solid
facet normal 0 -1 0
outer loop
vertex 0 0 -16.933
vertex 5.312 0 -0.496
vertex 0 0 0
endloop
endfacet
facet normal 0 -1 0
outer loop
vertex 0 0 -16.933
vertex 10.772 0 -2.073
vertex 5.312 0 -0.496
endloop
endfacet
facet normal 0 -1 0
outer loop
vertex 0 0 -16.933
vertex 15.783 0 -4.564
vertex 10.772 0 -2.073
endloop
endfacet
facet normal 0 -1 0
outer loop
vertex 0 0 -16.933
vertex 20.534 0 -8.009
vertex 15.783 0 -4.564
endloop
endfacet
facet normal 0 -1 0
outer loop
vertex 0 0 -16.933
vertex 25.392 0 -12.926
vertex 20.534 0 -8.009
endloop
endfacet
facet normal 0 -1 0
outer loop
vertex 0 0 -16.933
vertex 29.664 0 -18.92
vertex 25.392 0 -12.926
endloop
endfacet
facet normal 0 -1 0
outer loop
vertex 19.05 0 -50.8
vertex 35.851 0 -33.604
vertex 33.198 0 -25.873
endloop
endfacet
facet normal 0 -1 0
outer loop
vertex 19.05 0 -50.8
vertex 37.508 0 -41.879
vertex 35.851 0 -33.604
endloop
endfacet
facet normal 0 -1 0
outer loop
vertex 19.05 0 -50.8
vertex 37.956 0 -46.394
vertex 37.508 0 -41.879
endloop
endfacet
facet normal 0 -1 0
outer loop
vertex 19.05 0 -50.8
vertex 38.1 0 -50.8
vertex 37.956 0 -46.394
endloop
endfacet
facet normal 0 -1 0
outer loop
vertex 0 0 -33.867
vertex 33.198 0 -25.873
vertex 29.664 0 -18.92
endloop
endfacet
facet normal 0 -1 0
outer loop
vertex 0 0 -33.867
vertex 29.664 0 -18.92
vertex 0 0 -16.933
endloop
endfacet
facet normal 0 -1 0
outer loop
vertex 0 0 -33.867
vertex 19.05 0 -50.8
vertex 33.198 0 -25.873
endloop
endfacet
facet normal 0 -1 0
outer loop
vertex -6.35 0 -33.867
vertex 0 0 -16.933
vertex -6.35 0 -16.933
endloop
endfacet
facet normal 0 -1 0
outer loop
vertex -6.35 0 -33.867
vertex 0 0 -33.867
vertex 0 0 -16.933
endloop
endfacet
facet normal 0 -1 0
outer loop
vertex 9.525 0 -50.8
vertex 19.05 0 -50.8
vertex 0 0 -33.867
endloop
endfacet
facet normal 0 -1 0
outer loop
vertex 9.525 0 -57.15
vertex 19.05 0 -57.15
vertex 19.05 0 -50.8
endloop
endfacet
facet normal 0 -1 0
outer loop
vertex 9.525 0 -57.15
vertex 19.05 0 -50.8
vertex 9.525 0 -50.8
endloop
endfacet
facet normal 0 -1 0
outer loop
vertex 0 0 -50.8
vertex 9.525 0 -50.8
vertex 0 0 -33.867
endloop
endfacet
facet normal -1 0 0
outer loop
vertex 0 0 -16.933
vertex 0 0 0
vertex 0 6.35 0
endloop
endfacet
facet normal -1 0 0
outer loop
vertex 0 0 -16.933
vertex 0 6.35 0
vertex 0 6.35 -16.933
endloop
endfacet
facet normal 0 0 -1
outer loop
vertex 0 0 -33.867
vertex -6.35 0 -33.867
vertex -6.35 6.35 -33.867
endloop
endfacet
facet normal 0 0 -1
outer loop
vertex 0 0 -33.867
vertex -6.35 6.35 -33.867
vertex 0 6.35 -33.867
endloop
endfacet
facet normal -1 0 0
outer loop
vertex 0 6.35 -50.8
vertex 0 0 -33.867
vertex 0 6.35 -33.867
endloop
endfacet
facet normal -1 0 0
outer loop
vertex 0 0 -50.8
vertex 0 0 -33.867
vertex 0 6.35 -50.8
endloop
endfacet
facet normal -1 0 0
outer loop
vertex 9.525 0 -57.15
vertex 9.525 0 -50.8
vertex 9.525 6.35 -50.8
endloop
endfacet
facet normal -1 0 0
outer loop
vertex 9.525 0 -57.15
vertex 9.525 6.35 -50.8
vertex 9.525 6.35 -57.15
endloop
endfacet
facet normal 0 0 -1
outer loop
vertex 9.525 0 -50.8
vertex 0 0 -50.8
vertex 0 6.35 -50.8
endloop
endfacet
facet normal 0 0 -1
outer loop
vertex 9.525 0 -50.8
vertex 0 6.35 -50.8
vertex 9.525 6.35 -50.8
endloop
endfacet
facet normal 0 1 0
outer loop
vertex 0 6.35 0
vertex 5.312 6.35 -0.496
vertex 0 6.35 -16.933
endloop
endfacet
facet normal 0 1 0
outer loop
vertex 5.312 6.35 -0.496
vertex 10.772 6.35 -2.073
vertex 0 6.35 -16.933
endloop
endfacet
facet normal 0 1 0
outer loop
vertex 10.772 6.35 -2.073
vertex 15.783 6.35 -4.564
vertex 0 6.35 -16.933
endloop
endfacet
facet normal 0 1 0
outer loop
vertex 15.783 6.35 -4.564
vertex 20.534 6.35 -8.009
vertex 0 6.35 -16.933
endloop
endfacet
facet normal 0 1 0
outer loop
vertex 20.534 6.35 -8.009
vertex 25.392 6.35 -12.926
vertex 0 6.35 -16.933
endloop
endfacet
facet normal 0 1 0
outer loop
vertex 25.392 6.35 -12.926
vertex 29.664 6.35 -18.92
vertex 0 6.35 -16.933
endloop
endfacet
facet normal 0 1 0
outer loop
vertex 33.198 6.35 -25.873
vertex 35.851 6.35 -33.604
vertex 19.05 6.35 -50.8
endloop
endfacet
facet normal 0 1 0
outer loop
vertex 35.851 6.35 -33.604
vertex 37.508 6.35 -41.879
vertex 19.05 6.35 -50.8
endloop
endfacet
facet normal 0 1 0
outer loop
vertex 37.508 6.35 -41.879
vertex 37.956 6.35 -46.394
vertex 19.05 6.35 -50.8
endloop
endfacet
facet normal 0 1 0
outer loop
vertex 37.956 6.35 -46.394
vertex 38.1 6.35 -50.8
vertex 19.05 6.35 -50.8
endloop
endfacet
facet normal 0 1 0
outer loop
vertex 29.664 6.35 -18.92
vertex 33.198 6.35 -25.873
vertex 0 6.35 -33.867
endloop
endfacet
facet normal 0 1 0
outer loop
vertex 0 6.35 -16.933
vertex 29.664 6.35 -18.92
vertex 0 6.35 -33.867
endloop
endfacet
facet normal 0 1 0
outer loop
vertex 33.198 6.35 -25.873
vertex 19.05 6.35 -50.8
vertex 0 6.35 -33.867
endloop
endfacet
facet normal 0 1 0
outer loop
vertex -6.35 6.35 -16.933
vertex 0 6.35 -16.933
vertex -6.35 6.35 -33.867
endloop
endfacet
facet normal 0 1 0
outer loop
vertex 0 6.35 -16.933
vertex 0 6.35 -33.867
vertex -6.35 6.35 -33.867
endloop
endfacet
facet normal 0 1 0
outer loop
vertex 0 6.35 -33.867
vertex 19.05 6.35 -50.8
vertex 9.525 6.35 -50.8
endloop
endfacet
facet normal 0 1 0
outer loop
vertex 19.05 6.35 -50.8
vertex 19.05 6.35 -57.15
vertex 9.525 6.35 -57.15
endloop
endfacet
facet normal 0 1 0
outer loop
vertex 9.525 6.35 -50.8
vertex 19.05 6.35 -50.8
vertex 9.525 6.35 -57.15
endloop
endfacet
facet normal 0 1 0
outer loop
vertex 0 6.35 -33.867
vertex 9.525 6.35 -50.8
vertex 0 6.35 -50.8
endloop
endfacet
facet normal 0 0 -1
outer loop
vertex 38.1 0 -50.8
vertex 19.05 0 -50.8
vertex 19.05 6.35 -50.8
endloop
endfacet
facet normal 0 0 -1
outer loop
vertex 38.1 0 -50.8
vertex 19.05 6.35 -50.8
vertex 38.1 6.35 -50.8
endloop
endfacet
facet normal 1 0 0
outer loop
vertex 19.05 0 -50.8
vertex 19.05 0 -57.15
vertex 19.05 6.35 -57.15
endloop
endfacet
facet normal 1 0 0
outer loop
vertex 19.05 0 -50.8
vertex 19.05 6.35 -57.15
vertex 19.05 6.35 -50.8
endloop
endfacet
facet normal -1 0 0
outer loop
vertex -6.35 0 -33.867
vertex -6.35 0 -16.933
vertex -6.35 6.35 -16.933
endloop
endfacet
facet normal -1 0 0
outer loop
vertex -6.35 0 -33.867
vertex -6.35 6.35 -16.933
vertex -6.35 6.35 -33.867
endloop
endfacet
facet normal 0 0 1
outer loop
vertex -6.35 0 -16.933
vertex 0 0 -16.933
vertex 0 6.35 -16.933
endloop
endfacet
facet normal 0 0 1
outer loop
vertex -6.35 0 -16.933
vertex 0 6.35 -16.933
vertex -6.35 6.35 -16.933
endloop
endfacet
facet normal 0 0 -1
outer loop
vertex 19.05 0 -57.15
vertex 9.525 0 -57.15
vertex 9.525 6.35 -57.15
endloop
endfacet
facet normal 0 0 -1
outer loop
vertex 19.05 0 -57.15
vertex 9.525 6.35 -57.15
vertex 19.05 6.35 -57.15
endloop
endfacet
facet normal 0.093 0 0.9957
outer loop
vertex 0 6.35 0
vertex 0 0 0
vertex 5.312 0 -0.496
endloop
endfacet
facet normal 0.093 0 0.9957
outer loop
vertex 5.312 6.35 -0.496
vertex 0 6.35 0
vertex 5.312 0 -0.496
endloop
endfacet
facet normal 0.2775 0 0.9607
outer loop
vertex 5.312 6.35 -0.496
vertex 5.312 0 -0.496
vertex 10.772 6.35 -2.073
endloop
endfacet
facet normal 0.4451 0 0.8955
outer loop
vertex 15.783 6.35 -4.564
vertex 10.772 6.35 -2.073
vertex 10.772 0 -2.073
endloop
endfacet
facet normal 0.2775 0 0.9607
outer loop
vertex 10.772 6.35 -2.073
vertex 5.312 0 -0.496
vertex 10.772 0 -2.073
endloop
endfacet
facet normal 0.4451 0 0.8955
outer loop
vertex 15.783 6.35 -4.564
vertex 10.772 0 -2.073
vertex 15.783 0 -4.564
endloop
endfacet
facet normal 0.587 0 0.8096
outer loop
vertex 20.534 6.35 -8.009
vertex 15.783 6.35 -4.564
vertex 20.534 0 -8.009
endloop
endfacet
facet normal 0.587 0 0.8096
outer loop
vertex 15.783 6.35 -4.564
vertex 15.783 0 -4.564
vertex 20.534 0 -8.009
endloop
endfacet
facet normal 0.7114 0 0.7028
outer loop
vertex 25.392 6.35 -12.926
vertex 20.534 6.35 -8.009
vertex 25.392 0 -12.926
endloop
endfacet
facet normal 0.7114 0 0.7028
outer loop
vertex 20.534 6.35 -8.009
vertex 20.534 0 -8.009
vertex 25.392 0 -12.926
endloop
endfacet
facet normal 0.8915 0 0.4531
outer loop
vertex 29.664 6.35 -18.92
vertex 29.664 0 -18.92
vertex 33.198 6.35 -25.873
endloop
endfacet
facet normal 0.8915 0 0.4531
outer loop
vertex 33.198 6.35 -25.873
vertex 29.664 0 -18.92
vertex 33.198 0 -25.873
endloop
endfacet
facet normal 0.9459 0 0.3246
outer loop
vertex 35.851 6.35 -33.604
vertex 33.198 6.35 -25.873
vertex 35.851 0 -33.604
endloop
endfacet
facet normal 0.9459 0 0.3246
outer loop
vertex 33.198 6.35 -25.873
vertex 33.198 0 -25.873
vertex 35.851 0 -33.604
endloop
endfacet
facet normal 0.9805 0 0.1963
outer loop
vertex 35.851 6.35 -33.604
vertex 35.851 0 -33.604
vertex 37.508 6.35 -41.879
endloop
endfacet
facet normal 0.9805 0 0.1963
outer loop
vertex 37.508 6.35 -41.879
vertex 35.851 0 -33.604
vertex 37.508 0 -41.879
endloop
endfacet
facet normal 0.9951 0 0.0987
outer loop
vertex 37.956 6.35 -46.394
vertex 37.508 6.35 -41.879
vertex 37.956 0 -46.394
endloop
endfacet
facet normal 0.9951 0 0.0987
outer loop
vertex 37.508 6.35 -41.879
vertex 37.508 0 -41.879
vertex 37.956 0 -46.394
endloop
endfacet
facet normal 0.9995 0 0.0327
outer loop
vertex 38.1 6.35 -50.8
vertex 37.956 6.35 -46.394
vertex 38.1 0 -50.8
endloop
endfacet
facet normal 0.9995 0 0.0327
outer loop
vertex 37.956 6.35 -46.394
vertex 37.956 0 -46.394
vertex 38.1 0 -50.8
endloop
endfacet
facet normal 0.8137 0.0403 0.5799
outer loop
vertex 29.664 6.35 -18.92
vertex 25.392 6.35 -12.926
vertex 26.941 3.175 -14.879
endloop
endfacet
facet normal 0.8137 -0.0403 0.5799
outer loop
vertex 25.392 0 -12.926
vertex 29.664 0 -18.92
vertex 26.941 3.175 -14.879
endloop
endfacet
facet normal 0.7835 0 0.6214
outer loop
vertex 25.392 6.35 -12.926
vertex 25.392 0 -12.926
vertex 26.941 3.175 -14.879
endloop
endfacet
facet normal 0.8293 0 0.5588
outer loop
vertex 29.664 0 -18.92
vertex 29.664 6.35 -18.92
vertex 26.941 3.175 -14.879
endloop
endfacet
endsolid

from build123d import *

# Parameters (mm, degrees)
BOSS_EXTRUDE1_DEPTH = 6.35


with BuildPart() as part:
    # Sketch1 → Boss-Extrude1 (new body)
    with BuildSketch(Plane(origin=(0, 0, 0), x_dir=(1, 0, 0), z_dir=(0, 1, 0))):
        with BuildLine():
            Line((0, 0), (0, 16.933333418))
            Line((0, 16.933333418), (-6.35, 16.933333418))
            Line((-6.35, 16.933333418), (-6.35, 33.866666751))
            Line((-6.35, 33.866666751), (0, 33.866666751))
            Line((0, 33.866666751), (0, 50.800000085))
            Line((0, 50.800000085), (9.525, 50.800000085))
            Line((9.525, 50.800000085), (9.525, 57.150000085))
            Line((9.525, 57.150000085), (19.05, 57.150000085))
            Line((19.05, 57.150000085), (19.05, 50.800000085))
            Line((19.05, 50.800000085), (38.1, 50.800000085))
            add(Edge.make_bspline(
                [(0, 0), (38.1, 0), (38.1, 50.800000085)],
                knots=[3.141592654, 3.141592654, 3.141592654, 4.71238898, 4.71238898, 4.71238898], degree=2, weights=[1, 0.707106781, 1]))
        make_face()
    extrude(amount=BOSS_EXTRUDE1_DEPTH)


solid = part.part
